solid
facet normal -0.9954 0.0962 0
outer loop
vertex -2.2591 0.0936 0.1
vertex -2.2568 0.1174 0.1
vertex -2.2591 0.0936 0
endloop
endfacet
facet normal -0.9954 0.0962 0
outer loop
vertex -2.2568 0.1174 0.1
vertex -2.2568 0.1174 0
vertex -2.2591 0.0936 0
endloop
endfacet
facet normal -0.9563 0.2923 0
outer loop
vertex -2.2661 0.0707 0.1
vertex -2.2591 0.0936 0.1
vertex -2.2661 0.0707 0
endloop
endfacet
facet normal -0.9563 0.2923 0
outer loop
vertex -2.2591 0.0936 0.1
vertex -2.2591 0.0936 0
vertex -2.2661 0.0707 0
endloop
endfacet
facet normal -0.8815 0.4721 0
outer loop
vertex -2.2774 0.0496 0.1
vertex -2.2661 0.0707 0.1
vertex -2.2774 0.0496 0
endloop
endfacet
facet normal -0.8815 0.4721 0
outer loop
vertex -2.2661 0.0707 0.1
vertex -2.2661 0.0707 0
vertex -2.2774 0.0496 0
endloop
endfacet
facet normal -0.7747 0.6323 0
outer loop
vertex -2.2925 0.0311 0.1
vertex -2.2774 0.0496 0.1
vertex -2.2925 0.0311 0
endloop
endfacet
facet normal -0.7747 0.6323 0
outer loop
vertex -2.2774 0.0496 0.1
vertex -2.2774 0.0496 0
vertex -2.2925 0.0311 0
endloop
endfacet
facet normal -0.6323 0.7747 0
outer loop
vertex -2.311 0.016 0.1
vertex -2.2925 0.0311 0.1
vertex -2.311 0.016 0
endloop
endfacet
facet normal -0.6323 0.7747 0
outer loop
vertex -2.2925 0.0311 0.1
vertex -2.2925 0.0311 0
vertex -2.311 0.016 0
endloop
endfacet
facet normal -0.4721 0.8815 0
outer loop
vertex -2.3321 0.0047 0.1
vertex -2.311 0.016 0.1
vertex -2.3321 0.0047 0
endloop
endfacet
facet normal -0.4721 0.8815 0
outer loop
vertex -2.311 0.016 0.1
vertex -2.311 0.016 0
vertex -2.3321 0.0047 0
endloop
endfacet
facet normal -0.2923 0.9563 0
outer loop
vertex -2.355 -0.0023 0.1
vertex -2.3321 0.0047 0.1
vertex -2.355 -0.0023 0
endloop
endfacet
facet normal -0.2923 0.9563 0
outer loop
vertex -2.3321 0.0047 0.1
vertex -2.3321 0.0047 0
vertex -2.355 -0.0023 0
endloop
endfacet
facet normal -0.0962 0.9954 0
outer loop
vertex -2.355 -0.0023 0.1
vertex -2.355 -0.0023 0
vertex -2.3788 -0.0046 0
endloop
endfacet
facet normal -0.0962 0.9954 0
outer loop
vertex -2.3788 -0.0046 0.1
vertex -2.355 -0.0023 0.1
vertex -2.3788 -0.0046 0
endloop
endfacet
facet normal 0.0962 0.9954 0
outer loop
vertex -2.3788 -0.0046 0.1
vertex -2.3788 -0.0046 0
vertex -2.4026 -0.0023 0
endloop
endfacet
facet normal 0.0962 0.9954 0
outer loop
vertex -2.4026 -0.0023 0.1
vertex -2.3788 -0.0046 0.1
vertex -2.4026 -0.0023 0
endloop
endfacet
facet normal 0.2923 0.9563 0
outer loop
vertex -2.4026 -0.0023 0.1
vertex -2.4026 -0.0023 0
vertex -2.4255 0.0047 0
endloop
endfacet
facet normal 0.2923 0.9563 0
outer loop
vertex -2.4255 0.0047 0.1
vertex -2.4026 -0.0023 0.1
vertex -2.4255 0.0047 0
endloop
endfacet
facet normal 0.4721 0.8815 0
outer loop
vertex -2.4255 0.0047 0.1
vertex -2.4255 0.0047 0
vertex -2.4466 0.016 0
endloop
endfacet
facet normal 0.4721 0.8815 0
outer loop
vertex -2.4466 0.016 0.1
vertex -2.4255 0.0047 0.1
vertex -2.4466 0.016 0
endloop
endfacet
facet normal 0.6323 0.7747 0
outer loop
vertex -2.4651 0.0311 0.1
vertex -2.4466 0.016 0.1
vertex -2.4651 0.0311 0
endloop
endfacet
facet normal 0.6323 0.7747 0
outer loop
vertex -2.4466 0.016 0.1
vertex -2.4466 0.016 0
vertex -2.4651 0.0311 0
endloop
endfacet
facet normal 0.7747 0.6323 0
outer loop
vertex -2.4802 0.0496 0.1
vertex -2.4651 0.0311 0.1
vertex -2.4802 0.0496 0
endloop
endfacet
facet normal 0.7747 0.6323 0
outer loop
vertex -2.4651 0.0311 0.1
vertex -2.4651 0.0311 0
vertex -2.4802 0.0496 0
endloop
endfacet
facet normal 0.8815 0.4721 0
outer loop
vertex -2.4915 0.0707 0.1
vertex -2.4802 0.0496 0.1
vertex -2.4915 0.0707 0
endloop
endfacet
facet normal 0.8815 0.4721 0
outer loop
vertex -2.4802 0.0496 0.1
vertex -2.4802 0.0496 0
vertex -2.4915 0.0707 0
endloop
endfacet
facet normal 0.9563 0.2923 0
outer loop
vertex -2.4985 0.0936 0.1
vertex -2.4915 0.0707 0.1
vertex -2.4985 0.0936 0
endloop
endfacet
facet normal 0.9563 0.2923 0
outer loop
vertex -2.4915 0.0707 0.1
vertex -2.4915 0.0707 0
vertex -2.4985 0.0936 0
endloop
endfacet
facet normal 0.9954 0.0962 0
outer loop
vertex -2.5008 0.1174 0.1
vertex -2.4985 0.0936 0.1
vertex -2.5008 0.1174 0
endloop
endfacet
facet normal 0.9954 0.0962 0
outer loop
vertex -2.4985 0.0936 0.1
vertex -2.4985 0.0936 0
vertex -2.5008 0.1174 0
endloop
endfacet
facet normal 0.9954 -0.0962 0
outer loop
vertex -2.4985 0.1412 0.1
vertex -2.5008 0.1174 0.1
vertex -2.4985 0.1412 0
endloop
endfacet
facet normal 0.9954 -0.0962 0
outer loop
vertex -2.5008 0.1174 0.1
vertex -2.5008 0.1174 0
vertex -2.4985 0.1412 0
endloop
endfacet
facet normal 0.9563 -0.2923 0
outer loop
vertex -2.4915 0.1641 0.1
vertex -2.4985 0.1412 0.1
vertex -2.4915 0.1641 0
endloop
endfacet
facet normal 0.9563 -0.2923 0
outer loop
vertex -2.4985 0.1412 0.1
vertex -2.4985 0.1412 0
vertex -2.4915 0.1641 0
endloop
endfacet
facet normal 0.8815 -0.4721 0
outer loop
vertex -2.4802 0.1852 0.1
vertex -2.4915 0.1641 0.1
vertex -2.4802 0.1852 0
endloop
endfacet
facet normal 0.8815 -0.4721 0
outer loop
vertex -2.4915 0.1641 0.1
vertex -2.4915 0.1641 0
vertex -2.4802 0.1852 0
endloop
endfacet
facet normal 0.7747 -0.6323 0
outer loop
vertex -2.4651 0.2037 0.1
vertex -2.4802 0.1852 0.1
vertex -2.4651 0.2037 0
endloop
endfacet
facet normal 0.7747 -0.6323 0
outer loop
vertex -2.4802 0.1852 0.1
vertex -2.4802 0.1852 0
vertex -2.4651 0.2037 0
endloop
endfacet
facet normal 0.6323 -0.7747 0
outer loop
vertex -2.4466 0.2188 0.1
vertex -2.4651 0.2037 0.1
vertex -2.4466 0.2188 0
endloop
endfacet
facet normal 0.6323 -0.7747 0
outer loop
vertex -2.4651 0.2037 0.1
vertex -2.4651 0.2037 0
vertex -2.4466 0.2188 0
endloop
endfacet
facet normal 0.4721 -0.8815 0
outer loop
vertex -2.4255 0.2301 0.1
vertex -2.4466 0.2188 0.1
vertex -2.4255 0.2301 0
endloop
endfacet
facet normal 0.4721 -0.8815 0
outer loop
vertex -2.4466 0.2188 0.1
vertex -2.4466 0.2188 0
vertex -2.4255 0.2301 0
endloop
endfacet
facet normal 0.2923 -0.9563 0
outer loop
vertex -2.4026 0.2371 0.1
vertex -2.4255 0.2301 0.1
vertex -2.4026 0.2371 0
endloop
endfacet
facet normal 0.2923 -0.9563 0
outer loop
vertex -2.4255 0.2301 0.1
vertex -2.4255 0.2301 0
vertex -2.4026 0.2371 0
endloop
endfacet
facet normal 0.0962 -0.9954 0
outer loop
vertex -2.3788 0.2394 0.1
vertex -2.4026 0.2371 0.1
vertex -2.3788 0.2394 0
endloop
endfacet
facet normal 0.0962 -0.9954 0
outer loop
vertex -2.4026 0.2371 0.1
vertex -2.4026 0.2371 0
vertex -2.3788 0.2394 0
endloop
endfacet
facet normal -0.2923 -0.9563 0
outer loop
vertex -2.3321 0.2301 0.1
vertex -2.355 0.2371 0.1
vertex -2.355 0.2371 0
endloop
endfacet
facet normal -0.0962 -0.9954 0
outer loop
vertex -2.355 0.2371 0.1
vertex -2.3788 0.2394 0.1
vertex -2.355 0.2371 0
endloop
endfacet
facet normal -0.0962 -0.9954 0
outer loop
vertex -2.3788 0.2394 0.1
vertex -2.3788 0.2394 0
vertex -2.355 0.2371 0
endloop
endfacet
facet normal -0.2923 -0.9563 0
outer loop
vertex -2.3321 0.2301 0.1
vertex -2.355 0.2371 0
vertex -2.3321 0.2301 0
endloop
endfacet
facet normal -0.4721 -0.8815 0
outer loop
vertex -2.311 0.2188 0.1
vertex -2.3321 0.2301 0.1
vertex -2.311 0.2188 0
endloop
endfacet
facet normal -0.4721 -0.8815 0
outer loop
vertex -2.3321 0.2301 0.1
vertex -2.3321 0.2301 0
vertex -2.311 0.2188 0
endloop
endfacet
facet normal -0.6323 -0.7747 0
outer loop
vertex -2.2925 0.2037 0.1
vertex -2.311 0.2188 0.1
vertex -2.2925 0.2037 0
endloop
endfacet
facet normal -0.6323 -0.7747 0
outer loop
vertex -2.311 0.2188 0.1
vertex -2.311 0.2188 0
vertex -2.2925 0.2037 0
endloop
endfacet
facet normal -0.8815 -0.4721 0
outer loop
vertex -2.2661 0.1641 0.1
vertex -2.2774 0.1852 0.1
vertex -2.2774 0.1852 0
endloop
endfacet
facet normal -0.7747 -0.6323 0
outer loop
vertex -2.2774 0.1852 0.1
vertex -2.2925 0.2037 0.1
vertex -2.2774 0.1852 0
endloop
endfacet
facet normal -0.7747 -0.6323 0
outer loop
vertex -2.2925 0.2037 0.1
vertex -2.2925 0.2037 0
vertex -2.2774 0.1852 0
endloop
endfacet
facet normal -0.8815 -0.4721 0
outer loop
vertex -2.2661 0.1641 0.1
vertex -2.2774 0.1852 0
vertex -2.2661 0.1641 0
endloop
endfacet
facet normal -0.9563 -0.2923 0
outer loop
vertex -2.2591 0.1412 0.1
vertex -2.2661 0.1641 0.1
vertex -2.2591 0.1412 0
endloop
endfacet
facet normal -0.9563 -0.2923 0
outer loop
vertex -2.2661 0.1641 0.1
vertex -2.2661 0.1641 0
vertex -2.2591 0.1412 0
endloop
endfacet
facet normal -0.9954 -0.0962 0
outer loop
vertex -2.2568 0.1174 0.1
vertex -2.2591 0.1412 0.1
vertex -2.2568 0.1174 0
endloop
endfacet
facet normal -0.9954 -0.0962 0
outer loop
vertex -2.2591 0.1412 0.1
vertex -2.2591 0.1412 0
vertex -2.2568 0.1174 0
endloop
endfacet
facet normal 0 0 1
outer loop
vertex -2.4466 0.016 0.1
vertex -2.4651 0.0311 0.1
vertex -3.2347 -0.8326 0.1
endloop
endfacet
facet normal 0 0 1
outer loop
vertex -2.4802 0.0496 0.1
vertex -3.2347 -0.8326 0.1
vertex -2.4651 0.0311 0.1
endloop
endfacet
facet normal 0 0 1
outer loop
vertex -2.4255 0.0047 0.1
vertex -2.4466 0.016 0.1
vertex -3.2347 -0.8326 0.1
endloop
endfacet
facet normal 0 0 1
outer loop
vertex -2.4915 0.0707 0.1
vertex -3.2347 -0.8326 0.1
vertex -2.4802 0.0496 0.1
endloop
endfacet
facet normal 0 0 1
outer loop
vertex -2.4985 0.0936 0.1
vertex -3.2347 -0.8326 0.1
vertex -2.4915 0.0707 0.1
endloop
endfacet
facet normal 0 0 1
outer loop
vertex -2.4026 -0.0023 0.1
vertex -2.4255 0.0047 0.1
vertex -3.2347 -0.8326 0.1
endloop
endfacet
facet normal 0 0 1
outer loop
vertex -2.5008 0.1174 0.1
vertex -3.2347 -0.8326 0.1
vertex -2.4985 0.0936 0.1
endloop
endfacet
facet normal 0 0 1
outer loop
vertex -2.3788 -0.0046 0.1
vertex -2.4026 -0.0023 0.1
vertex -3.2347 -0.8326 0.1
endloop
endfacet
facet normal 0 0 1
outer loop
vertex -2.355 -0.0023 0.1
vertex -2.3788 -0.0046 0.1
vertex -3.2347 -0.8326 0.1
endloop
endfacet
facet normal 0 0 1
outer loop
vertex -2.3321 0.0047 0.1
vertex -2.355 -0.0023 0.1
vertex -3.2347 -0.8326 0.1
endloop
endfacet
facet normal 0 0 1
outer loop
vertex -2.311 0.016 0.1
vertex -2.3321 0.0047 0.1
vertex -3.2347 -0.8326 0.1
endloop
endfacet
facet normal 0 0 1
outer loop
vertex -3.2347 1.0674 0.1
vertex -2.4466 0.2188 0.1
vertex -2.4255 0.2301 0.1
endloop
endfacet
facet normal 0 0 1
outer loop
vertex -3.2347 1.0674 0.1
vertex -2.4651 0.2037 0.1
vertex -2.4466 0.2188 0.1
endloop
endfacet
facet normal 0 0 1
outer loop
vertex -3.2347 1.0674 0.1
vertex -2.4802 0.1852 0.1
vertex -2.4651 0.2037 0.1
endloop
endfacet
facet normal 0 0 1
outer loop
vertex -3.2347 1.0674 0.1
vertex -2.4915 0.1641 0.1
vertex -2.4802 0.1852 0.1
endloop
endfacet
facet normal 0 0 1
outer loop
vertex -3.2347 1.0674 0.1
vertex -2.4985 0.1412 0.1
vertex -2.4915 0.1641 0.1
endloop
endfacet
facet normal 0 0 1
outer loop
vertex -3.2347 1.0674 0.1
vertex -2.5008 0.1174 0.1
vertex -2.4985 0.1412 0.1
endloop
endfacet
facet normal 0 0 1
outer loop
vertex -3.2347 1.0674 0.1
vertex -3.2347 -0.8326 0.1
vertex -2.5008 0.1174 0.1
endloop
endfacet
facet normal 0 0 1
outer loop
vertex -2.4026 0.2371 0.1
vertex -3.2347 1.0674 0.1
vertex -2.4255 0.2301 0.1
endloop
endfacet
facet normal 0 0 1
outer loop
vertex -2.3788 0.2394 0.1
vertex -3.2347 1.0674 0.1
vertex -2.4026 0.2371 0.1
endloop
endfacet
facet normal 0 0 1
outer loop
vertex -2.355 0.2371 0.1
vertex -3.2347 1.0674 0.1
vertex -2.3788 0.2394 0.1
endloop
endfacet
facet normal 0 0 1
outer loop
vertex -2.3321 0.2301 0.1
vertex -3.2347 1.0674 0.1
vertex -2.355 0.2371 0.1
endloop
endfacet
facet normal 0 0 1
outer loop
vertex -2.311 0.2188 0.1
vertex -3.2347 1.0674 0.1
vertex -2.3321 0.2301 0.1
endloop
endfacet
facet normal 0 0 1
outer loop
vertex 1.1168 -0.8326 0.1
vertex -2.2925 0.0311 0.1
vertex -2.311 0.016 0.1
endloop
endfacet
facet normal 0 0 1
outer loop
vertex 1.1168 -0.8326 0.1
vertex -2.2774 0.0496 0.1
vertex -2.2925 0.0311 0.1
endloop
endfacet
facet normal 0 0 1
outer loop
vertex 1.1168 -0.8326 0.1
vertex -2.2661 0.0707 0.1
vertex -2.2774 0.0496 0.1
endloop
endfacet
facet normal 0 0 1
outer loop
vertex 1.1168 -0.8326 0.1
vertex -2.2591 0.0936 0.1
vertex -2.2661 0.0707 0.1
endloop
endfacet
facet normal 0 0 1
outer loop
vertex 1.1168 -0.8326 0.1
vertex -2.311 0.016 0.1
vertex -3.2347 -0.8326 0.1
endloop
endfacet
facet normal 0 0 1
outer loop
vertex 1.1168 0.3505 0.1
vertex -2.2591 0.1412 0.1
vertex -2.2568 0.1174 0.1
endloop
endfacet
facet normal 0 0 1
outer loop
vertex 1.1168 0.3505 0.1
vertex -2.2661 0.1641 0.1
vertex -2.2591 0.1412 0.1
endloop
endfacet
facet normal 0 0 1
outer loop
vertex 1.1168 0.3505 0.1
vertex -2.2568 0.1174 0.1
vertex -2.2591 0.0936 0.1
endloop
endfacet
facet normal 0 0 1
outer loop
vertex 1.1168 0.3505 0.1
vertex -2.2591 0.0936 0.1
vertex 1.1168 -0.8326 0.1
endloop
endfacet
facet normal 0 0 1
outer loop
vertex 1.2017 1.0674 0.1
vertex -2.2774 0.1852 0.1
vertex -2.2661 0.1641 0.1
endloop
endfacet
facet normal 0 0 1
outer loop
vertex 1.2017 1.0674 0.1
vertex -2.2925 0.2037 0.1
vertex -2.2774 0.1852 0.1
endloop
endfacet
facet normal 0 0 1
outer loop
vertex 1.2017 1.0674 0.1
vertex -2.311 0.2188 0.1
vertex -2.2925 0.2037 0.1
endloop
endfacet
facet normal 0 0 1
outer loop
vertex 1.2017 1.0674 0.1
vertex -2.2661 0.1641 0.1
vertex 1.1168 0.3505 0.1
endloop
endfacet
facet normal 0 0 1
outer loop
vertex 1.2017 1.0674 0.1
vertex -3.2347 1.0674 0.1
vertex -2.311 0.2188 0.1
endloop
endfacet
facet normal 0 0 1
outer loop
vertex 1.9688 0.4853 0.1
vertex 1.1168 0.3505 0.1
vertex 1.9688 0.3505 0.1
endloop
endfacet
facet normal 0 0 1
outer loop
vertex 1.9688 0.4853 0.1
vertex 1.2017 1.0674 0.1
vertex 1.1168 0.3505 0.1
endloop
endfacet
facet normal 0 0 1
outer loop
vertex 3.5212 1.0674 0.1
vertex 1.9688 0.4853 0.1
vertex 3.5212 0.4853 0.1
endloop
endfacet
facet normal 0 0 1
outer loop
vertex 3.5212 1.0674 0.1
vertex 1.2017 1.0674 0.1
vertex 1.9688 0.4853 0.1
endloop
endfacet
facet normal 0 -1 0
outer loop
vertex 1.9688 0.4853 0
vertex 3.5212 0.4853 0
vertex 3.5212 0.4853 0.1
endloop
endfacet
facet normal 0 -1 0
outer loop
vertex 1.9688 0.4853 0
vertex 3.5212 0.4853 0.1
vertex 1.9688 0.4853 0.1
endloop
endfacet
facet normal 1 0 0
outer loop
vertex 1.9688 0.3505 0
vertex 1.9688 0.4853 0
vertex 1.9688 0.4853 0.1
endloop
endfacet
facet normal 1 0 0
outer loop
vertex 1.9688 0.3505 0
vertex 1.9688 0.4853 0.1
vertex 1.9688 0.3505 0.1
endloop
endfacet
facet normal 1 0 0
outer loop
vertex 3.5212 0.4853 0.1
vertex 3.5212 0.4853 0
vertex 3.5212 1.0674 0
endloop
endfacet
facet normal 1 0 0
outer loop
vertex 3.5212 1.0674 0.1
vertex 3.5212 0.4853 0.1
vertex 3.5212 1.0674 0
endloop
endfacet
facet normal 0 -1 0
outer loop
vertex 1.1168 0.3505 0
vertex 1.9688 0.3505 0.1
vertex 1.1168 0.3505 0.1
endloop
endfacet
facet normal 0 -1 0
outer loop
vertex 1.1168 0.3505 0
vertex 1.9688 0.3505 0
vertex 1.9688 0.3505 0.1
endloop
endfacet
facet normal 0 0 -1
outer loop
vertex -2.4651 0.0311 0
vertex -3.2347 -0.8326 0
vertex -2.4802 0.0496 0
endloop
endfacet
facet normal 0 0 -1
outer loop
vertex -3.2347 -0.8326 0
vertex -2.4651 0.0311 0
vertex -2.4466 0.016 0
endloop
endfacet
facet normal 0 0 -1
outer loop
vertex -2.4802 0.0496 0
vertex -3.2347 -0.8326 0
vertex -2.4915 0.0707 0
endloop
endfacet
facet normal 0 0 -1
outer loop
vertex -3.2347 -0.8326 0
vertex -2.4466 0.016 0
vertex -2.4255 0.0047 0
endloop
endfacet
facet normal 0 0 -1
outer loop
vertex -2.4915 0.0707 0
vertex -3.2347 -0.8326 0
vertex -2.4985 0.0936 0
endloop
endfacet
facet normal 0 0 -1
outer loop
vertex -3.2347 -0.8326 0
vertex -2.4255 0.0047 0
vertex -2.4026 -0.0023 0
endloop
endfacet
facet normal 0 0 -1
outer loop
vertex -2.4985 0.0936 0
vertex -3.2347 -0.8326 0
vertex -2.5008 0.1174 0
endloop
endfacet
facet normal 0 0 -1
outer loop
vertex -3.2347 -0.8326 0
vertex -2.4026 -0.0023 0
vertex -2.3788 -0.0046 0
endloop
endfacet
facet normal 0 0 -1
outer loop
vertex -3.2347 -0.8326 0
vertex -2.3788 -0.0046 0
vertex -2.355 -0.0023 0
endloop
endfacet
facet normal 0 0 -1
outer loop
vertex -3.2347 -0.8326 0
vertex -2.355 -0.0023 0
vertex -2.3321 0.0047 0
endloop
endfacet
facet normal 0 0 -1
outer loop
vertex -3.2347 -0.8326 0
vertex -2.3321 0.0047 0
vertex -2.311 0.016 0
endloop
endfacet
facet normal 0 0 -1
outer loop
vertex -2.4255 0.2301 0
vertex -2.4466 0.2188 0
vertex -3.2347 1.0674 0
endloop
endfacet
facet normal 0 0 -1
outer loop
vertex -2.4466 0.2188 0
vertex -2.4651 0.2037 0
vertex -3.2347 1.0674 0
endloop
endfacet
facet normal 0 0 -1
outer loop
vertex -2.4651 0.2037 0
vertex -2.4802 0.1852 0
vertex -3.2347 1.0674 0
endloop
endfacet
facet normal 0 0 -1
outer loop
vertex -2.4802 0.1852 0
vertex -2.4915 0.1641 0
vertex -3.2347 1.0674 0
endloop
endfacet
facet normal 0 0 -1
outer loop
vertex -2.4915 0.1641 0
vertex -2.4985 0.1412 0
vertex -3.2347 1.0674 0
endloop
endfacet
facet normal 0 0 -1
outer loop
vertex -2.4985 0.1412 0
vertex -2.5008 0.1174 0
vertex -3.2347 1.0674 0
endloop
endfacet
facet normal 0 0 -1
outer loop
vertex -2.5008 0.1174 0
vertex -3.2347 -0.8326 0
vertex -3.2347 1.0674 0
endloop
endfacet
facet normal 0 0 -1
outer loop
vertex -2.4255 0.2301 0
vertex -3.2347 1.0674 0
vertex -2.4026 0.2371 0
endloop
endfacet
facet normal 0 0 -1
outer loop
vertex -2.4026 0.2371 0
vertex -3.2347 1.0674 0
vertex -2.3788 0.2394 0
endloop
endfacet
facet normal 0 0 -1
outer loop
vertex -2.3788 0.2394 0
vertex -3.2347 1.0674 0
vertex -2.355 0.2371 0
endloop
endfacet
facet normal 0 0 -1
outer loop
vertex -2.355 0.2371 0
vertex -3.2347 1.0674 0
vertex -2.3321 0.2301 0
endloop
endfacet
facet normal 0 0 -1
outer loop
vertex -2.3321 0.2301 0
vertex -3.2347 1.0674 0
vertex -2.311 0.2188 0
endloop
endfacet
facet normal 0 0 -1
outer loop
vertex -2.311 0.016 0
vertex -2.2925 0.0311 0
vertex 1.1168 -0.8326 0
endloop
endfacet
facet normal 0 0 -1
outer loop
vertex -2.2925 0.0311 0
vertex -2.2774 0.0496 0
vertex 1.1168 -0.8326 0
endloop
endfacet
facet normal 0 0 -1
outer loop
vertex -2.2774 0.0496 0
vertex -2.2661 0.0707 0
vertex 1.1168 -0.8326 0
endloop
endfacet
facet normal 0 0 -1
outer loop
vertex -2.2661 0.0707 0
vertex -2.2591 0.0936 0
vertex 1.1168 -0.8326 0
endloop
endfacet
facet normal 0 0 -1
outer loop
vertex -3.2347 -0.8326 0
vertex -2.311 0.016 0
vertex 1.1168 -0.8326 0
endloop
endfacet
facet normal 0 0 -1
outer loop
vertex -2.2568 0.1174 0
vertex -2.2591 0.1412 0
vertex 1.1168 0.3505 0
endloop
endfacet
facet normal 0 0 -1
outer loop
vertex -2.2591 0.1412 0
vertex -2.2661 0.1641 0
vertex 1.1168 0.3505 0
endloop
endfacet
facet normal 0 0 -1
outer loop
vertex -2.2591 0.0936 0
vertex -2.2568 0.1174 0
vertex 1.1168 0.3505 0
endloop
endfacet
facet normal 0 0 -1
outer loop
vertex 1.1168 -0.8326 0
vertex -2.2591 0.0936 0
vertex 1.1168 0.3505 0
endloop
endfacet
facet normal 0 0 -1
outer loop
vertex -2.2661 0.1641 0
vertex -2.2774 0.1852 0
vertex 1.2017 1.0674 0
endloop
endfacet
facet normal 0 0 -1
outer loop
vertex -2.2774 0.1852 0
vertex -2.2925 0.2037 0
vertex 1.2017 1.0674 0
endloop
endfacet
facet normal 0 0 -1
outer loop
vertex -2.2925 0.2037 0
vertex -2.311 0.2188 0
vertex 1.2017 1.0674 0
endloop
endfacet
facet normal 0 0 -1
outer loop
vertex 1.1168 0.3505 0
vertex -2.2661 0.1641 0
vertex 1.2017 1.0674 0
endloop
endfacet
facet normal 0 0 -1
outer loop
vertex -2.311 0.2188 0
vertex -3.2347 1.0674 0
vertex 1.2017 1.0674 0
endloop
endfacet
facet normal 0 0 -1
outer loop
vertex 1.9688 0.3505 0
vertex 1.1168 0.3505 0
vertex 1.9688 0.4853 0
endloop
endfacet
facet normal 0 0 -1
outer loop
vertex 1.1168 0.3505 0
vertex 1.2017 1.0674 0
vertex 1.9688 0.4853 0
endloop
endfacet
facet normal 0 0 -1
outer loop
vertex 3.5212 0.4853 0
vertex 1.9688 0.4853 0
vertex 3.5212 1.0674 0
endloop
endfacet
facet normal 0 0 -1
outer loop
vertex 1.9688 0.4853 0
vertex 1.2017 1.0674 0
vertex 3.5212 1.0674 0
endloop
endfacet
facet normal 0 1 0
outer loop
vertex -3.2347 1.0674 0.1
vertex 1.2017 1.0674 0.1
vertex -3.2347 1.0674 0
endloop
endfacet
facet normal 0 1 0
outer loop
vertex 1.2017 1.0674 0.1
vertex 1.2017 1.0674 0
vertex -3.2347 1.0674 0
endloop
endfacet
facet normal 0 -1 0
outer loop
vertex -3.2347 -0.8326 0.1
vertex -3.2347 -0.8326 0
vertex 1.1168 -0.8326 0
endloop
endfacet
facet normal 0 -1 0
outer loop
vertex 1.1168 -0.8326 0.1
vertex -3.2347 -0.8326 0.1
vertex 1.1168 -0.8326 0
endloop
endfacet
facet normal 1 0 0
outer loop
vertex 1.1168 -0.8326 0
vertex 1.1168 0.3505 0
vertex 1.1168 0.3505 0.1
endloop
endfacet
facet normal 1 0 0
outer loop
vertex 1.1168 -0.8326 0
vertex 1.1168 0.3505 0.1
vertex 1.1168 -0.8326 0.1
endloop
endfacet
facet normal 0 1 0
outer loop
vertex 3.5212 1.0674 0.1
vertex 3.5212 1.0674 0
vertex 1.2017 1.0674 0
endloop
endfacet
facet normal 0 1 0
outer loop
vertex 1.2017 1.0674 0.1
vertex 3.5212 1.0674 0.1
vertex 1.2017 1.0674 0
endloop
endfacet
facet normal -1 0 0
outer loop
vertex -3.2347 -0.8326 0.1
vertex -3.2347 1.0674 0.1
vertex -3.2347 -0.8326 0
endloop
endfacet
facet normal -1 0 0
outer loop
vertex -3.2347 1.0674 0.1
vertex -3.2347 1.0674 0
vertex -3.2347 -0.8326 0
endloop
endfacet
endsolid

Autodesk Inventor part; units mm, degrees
ref_plane "YZ Plane" through (0, 0, 0) normal (1, 0, 0) x (0, 1, 0)
ref_plane "XZ Plane" through (0, 0, 0) normal (0, 1, 0) x (-1, 0, 0)
ref_plane "XY Plane" through (0, 0, 0) normal (0, 0, 1) x (1, 0, 0)
sketch "Sketch2" plane through (0, 0, 0) normal (0, 0, 1) x (1, 0, 0)
  line L0 (-3.2347, 1.0674) -> (-3.2347, -0.8326) projected
  line L1 (-3.2347, -0.8326) -> (1.2942, -0.8326) projected
  line L2 (3.5212, -0.8326) -> (3.5212, -0.2505) projected
  line L3 (1.2017, 1.0674) -> (-3.2347, 1.0674) projected
  line L4 (3.5212, 1.0674) -> (-3.2347, 1.0674)
  line L5 (-3.2347, 1.0674) -> (-3.2347, -0.8326)
  line L6 (-3.2347, 0.1174) -> (3.5212, 0.1174) construction
  line L7 (1.9688, -0.1158) -> (1.5482, -0.1158) construction
  line L8 (3.5212, -0.2505) -> (1.9688, -0.2505) construction
  line L9 (1.5482, -0.8326) -> (1.5482, -0.1158) projected
  line L10 (1.5482, -0.8326) -> (3.5212, -0.8326) projected
  line L11 (3.5212, -0.8326) -> (3.5212, -0.2505) projected
  line L12 (3.5212, -0.2505) -> (1.9688, -0.2505) projected
  line L13 (1.9688, -0.2505) -> (1.9688, -0.1158) projected
  line L14 (1.9688, -0.1158) -> (1.5482, -0.1158) projected
  line L15 (1.9688, 0.3505) -> (1.5482, 0.3505) construction
  line L16 (3.5212, 0.4853) -> (1.9688, 0.4853) construction
  line L17 (3.5212, 0.4853) -> (1.9688, 0.4853)
  line L18 (1.9688, 0.3505) -> (1.1168, 0.3505)
  line L19 (1.1168, 0.3505) -> (1.1168, -0.8326)
  line L20 (1.9688, 0.4853) -> (1.9688, 0.3505)
  line L21 (3.5212, -0.8326) -> (3.5212, 0.1174)
  line L22 (3.5212, 0.4853) -> (3.5212, 1.0674)
  line L23 (-3.2347, -0.8326) -> (1.1168, -0.8326)
  line L24 (1.5482, -0.8326) -> (3.5212, -0.8326)
  circle A0 centre (-2.3788, 0.1174) radius 0.122 projected
  point P0 (0, 0)
extrude "Extrusion1" add sketch "Sketch2" along normal blind 0.1 contours L3 L4 L22 L17 L20 L18 L19 L1 L0
properties part number "NegTerm" material "Nickel-Copper Alloy 400"
